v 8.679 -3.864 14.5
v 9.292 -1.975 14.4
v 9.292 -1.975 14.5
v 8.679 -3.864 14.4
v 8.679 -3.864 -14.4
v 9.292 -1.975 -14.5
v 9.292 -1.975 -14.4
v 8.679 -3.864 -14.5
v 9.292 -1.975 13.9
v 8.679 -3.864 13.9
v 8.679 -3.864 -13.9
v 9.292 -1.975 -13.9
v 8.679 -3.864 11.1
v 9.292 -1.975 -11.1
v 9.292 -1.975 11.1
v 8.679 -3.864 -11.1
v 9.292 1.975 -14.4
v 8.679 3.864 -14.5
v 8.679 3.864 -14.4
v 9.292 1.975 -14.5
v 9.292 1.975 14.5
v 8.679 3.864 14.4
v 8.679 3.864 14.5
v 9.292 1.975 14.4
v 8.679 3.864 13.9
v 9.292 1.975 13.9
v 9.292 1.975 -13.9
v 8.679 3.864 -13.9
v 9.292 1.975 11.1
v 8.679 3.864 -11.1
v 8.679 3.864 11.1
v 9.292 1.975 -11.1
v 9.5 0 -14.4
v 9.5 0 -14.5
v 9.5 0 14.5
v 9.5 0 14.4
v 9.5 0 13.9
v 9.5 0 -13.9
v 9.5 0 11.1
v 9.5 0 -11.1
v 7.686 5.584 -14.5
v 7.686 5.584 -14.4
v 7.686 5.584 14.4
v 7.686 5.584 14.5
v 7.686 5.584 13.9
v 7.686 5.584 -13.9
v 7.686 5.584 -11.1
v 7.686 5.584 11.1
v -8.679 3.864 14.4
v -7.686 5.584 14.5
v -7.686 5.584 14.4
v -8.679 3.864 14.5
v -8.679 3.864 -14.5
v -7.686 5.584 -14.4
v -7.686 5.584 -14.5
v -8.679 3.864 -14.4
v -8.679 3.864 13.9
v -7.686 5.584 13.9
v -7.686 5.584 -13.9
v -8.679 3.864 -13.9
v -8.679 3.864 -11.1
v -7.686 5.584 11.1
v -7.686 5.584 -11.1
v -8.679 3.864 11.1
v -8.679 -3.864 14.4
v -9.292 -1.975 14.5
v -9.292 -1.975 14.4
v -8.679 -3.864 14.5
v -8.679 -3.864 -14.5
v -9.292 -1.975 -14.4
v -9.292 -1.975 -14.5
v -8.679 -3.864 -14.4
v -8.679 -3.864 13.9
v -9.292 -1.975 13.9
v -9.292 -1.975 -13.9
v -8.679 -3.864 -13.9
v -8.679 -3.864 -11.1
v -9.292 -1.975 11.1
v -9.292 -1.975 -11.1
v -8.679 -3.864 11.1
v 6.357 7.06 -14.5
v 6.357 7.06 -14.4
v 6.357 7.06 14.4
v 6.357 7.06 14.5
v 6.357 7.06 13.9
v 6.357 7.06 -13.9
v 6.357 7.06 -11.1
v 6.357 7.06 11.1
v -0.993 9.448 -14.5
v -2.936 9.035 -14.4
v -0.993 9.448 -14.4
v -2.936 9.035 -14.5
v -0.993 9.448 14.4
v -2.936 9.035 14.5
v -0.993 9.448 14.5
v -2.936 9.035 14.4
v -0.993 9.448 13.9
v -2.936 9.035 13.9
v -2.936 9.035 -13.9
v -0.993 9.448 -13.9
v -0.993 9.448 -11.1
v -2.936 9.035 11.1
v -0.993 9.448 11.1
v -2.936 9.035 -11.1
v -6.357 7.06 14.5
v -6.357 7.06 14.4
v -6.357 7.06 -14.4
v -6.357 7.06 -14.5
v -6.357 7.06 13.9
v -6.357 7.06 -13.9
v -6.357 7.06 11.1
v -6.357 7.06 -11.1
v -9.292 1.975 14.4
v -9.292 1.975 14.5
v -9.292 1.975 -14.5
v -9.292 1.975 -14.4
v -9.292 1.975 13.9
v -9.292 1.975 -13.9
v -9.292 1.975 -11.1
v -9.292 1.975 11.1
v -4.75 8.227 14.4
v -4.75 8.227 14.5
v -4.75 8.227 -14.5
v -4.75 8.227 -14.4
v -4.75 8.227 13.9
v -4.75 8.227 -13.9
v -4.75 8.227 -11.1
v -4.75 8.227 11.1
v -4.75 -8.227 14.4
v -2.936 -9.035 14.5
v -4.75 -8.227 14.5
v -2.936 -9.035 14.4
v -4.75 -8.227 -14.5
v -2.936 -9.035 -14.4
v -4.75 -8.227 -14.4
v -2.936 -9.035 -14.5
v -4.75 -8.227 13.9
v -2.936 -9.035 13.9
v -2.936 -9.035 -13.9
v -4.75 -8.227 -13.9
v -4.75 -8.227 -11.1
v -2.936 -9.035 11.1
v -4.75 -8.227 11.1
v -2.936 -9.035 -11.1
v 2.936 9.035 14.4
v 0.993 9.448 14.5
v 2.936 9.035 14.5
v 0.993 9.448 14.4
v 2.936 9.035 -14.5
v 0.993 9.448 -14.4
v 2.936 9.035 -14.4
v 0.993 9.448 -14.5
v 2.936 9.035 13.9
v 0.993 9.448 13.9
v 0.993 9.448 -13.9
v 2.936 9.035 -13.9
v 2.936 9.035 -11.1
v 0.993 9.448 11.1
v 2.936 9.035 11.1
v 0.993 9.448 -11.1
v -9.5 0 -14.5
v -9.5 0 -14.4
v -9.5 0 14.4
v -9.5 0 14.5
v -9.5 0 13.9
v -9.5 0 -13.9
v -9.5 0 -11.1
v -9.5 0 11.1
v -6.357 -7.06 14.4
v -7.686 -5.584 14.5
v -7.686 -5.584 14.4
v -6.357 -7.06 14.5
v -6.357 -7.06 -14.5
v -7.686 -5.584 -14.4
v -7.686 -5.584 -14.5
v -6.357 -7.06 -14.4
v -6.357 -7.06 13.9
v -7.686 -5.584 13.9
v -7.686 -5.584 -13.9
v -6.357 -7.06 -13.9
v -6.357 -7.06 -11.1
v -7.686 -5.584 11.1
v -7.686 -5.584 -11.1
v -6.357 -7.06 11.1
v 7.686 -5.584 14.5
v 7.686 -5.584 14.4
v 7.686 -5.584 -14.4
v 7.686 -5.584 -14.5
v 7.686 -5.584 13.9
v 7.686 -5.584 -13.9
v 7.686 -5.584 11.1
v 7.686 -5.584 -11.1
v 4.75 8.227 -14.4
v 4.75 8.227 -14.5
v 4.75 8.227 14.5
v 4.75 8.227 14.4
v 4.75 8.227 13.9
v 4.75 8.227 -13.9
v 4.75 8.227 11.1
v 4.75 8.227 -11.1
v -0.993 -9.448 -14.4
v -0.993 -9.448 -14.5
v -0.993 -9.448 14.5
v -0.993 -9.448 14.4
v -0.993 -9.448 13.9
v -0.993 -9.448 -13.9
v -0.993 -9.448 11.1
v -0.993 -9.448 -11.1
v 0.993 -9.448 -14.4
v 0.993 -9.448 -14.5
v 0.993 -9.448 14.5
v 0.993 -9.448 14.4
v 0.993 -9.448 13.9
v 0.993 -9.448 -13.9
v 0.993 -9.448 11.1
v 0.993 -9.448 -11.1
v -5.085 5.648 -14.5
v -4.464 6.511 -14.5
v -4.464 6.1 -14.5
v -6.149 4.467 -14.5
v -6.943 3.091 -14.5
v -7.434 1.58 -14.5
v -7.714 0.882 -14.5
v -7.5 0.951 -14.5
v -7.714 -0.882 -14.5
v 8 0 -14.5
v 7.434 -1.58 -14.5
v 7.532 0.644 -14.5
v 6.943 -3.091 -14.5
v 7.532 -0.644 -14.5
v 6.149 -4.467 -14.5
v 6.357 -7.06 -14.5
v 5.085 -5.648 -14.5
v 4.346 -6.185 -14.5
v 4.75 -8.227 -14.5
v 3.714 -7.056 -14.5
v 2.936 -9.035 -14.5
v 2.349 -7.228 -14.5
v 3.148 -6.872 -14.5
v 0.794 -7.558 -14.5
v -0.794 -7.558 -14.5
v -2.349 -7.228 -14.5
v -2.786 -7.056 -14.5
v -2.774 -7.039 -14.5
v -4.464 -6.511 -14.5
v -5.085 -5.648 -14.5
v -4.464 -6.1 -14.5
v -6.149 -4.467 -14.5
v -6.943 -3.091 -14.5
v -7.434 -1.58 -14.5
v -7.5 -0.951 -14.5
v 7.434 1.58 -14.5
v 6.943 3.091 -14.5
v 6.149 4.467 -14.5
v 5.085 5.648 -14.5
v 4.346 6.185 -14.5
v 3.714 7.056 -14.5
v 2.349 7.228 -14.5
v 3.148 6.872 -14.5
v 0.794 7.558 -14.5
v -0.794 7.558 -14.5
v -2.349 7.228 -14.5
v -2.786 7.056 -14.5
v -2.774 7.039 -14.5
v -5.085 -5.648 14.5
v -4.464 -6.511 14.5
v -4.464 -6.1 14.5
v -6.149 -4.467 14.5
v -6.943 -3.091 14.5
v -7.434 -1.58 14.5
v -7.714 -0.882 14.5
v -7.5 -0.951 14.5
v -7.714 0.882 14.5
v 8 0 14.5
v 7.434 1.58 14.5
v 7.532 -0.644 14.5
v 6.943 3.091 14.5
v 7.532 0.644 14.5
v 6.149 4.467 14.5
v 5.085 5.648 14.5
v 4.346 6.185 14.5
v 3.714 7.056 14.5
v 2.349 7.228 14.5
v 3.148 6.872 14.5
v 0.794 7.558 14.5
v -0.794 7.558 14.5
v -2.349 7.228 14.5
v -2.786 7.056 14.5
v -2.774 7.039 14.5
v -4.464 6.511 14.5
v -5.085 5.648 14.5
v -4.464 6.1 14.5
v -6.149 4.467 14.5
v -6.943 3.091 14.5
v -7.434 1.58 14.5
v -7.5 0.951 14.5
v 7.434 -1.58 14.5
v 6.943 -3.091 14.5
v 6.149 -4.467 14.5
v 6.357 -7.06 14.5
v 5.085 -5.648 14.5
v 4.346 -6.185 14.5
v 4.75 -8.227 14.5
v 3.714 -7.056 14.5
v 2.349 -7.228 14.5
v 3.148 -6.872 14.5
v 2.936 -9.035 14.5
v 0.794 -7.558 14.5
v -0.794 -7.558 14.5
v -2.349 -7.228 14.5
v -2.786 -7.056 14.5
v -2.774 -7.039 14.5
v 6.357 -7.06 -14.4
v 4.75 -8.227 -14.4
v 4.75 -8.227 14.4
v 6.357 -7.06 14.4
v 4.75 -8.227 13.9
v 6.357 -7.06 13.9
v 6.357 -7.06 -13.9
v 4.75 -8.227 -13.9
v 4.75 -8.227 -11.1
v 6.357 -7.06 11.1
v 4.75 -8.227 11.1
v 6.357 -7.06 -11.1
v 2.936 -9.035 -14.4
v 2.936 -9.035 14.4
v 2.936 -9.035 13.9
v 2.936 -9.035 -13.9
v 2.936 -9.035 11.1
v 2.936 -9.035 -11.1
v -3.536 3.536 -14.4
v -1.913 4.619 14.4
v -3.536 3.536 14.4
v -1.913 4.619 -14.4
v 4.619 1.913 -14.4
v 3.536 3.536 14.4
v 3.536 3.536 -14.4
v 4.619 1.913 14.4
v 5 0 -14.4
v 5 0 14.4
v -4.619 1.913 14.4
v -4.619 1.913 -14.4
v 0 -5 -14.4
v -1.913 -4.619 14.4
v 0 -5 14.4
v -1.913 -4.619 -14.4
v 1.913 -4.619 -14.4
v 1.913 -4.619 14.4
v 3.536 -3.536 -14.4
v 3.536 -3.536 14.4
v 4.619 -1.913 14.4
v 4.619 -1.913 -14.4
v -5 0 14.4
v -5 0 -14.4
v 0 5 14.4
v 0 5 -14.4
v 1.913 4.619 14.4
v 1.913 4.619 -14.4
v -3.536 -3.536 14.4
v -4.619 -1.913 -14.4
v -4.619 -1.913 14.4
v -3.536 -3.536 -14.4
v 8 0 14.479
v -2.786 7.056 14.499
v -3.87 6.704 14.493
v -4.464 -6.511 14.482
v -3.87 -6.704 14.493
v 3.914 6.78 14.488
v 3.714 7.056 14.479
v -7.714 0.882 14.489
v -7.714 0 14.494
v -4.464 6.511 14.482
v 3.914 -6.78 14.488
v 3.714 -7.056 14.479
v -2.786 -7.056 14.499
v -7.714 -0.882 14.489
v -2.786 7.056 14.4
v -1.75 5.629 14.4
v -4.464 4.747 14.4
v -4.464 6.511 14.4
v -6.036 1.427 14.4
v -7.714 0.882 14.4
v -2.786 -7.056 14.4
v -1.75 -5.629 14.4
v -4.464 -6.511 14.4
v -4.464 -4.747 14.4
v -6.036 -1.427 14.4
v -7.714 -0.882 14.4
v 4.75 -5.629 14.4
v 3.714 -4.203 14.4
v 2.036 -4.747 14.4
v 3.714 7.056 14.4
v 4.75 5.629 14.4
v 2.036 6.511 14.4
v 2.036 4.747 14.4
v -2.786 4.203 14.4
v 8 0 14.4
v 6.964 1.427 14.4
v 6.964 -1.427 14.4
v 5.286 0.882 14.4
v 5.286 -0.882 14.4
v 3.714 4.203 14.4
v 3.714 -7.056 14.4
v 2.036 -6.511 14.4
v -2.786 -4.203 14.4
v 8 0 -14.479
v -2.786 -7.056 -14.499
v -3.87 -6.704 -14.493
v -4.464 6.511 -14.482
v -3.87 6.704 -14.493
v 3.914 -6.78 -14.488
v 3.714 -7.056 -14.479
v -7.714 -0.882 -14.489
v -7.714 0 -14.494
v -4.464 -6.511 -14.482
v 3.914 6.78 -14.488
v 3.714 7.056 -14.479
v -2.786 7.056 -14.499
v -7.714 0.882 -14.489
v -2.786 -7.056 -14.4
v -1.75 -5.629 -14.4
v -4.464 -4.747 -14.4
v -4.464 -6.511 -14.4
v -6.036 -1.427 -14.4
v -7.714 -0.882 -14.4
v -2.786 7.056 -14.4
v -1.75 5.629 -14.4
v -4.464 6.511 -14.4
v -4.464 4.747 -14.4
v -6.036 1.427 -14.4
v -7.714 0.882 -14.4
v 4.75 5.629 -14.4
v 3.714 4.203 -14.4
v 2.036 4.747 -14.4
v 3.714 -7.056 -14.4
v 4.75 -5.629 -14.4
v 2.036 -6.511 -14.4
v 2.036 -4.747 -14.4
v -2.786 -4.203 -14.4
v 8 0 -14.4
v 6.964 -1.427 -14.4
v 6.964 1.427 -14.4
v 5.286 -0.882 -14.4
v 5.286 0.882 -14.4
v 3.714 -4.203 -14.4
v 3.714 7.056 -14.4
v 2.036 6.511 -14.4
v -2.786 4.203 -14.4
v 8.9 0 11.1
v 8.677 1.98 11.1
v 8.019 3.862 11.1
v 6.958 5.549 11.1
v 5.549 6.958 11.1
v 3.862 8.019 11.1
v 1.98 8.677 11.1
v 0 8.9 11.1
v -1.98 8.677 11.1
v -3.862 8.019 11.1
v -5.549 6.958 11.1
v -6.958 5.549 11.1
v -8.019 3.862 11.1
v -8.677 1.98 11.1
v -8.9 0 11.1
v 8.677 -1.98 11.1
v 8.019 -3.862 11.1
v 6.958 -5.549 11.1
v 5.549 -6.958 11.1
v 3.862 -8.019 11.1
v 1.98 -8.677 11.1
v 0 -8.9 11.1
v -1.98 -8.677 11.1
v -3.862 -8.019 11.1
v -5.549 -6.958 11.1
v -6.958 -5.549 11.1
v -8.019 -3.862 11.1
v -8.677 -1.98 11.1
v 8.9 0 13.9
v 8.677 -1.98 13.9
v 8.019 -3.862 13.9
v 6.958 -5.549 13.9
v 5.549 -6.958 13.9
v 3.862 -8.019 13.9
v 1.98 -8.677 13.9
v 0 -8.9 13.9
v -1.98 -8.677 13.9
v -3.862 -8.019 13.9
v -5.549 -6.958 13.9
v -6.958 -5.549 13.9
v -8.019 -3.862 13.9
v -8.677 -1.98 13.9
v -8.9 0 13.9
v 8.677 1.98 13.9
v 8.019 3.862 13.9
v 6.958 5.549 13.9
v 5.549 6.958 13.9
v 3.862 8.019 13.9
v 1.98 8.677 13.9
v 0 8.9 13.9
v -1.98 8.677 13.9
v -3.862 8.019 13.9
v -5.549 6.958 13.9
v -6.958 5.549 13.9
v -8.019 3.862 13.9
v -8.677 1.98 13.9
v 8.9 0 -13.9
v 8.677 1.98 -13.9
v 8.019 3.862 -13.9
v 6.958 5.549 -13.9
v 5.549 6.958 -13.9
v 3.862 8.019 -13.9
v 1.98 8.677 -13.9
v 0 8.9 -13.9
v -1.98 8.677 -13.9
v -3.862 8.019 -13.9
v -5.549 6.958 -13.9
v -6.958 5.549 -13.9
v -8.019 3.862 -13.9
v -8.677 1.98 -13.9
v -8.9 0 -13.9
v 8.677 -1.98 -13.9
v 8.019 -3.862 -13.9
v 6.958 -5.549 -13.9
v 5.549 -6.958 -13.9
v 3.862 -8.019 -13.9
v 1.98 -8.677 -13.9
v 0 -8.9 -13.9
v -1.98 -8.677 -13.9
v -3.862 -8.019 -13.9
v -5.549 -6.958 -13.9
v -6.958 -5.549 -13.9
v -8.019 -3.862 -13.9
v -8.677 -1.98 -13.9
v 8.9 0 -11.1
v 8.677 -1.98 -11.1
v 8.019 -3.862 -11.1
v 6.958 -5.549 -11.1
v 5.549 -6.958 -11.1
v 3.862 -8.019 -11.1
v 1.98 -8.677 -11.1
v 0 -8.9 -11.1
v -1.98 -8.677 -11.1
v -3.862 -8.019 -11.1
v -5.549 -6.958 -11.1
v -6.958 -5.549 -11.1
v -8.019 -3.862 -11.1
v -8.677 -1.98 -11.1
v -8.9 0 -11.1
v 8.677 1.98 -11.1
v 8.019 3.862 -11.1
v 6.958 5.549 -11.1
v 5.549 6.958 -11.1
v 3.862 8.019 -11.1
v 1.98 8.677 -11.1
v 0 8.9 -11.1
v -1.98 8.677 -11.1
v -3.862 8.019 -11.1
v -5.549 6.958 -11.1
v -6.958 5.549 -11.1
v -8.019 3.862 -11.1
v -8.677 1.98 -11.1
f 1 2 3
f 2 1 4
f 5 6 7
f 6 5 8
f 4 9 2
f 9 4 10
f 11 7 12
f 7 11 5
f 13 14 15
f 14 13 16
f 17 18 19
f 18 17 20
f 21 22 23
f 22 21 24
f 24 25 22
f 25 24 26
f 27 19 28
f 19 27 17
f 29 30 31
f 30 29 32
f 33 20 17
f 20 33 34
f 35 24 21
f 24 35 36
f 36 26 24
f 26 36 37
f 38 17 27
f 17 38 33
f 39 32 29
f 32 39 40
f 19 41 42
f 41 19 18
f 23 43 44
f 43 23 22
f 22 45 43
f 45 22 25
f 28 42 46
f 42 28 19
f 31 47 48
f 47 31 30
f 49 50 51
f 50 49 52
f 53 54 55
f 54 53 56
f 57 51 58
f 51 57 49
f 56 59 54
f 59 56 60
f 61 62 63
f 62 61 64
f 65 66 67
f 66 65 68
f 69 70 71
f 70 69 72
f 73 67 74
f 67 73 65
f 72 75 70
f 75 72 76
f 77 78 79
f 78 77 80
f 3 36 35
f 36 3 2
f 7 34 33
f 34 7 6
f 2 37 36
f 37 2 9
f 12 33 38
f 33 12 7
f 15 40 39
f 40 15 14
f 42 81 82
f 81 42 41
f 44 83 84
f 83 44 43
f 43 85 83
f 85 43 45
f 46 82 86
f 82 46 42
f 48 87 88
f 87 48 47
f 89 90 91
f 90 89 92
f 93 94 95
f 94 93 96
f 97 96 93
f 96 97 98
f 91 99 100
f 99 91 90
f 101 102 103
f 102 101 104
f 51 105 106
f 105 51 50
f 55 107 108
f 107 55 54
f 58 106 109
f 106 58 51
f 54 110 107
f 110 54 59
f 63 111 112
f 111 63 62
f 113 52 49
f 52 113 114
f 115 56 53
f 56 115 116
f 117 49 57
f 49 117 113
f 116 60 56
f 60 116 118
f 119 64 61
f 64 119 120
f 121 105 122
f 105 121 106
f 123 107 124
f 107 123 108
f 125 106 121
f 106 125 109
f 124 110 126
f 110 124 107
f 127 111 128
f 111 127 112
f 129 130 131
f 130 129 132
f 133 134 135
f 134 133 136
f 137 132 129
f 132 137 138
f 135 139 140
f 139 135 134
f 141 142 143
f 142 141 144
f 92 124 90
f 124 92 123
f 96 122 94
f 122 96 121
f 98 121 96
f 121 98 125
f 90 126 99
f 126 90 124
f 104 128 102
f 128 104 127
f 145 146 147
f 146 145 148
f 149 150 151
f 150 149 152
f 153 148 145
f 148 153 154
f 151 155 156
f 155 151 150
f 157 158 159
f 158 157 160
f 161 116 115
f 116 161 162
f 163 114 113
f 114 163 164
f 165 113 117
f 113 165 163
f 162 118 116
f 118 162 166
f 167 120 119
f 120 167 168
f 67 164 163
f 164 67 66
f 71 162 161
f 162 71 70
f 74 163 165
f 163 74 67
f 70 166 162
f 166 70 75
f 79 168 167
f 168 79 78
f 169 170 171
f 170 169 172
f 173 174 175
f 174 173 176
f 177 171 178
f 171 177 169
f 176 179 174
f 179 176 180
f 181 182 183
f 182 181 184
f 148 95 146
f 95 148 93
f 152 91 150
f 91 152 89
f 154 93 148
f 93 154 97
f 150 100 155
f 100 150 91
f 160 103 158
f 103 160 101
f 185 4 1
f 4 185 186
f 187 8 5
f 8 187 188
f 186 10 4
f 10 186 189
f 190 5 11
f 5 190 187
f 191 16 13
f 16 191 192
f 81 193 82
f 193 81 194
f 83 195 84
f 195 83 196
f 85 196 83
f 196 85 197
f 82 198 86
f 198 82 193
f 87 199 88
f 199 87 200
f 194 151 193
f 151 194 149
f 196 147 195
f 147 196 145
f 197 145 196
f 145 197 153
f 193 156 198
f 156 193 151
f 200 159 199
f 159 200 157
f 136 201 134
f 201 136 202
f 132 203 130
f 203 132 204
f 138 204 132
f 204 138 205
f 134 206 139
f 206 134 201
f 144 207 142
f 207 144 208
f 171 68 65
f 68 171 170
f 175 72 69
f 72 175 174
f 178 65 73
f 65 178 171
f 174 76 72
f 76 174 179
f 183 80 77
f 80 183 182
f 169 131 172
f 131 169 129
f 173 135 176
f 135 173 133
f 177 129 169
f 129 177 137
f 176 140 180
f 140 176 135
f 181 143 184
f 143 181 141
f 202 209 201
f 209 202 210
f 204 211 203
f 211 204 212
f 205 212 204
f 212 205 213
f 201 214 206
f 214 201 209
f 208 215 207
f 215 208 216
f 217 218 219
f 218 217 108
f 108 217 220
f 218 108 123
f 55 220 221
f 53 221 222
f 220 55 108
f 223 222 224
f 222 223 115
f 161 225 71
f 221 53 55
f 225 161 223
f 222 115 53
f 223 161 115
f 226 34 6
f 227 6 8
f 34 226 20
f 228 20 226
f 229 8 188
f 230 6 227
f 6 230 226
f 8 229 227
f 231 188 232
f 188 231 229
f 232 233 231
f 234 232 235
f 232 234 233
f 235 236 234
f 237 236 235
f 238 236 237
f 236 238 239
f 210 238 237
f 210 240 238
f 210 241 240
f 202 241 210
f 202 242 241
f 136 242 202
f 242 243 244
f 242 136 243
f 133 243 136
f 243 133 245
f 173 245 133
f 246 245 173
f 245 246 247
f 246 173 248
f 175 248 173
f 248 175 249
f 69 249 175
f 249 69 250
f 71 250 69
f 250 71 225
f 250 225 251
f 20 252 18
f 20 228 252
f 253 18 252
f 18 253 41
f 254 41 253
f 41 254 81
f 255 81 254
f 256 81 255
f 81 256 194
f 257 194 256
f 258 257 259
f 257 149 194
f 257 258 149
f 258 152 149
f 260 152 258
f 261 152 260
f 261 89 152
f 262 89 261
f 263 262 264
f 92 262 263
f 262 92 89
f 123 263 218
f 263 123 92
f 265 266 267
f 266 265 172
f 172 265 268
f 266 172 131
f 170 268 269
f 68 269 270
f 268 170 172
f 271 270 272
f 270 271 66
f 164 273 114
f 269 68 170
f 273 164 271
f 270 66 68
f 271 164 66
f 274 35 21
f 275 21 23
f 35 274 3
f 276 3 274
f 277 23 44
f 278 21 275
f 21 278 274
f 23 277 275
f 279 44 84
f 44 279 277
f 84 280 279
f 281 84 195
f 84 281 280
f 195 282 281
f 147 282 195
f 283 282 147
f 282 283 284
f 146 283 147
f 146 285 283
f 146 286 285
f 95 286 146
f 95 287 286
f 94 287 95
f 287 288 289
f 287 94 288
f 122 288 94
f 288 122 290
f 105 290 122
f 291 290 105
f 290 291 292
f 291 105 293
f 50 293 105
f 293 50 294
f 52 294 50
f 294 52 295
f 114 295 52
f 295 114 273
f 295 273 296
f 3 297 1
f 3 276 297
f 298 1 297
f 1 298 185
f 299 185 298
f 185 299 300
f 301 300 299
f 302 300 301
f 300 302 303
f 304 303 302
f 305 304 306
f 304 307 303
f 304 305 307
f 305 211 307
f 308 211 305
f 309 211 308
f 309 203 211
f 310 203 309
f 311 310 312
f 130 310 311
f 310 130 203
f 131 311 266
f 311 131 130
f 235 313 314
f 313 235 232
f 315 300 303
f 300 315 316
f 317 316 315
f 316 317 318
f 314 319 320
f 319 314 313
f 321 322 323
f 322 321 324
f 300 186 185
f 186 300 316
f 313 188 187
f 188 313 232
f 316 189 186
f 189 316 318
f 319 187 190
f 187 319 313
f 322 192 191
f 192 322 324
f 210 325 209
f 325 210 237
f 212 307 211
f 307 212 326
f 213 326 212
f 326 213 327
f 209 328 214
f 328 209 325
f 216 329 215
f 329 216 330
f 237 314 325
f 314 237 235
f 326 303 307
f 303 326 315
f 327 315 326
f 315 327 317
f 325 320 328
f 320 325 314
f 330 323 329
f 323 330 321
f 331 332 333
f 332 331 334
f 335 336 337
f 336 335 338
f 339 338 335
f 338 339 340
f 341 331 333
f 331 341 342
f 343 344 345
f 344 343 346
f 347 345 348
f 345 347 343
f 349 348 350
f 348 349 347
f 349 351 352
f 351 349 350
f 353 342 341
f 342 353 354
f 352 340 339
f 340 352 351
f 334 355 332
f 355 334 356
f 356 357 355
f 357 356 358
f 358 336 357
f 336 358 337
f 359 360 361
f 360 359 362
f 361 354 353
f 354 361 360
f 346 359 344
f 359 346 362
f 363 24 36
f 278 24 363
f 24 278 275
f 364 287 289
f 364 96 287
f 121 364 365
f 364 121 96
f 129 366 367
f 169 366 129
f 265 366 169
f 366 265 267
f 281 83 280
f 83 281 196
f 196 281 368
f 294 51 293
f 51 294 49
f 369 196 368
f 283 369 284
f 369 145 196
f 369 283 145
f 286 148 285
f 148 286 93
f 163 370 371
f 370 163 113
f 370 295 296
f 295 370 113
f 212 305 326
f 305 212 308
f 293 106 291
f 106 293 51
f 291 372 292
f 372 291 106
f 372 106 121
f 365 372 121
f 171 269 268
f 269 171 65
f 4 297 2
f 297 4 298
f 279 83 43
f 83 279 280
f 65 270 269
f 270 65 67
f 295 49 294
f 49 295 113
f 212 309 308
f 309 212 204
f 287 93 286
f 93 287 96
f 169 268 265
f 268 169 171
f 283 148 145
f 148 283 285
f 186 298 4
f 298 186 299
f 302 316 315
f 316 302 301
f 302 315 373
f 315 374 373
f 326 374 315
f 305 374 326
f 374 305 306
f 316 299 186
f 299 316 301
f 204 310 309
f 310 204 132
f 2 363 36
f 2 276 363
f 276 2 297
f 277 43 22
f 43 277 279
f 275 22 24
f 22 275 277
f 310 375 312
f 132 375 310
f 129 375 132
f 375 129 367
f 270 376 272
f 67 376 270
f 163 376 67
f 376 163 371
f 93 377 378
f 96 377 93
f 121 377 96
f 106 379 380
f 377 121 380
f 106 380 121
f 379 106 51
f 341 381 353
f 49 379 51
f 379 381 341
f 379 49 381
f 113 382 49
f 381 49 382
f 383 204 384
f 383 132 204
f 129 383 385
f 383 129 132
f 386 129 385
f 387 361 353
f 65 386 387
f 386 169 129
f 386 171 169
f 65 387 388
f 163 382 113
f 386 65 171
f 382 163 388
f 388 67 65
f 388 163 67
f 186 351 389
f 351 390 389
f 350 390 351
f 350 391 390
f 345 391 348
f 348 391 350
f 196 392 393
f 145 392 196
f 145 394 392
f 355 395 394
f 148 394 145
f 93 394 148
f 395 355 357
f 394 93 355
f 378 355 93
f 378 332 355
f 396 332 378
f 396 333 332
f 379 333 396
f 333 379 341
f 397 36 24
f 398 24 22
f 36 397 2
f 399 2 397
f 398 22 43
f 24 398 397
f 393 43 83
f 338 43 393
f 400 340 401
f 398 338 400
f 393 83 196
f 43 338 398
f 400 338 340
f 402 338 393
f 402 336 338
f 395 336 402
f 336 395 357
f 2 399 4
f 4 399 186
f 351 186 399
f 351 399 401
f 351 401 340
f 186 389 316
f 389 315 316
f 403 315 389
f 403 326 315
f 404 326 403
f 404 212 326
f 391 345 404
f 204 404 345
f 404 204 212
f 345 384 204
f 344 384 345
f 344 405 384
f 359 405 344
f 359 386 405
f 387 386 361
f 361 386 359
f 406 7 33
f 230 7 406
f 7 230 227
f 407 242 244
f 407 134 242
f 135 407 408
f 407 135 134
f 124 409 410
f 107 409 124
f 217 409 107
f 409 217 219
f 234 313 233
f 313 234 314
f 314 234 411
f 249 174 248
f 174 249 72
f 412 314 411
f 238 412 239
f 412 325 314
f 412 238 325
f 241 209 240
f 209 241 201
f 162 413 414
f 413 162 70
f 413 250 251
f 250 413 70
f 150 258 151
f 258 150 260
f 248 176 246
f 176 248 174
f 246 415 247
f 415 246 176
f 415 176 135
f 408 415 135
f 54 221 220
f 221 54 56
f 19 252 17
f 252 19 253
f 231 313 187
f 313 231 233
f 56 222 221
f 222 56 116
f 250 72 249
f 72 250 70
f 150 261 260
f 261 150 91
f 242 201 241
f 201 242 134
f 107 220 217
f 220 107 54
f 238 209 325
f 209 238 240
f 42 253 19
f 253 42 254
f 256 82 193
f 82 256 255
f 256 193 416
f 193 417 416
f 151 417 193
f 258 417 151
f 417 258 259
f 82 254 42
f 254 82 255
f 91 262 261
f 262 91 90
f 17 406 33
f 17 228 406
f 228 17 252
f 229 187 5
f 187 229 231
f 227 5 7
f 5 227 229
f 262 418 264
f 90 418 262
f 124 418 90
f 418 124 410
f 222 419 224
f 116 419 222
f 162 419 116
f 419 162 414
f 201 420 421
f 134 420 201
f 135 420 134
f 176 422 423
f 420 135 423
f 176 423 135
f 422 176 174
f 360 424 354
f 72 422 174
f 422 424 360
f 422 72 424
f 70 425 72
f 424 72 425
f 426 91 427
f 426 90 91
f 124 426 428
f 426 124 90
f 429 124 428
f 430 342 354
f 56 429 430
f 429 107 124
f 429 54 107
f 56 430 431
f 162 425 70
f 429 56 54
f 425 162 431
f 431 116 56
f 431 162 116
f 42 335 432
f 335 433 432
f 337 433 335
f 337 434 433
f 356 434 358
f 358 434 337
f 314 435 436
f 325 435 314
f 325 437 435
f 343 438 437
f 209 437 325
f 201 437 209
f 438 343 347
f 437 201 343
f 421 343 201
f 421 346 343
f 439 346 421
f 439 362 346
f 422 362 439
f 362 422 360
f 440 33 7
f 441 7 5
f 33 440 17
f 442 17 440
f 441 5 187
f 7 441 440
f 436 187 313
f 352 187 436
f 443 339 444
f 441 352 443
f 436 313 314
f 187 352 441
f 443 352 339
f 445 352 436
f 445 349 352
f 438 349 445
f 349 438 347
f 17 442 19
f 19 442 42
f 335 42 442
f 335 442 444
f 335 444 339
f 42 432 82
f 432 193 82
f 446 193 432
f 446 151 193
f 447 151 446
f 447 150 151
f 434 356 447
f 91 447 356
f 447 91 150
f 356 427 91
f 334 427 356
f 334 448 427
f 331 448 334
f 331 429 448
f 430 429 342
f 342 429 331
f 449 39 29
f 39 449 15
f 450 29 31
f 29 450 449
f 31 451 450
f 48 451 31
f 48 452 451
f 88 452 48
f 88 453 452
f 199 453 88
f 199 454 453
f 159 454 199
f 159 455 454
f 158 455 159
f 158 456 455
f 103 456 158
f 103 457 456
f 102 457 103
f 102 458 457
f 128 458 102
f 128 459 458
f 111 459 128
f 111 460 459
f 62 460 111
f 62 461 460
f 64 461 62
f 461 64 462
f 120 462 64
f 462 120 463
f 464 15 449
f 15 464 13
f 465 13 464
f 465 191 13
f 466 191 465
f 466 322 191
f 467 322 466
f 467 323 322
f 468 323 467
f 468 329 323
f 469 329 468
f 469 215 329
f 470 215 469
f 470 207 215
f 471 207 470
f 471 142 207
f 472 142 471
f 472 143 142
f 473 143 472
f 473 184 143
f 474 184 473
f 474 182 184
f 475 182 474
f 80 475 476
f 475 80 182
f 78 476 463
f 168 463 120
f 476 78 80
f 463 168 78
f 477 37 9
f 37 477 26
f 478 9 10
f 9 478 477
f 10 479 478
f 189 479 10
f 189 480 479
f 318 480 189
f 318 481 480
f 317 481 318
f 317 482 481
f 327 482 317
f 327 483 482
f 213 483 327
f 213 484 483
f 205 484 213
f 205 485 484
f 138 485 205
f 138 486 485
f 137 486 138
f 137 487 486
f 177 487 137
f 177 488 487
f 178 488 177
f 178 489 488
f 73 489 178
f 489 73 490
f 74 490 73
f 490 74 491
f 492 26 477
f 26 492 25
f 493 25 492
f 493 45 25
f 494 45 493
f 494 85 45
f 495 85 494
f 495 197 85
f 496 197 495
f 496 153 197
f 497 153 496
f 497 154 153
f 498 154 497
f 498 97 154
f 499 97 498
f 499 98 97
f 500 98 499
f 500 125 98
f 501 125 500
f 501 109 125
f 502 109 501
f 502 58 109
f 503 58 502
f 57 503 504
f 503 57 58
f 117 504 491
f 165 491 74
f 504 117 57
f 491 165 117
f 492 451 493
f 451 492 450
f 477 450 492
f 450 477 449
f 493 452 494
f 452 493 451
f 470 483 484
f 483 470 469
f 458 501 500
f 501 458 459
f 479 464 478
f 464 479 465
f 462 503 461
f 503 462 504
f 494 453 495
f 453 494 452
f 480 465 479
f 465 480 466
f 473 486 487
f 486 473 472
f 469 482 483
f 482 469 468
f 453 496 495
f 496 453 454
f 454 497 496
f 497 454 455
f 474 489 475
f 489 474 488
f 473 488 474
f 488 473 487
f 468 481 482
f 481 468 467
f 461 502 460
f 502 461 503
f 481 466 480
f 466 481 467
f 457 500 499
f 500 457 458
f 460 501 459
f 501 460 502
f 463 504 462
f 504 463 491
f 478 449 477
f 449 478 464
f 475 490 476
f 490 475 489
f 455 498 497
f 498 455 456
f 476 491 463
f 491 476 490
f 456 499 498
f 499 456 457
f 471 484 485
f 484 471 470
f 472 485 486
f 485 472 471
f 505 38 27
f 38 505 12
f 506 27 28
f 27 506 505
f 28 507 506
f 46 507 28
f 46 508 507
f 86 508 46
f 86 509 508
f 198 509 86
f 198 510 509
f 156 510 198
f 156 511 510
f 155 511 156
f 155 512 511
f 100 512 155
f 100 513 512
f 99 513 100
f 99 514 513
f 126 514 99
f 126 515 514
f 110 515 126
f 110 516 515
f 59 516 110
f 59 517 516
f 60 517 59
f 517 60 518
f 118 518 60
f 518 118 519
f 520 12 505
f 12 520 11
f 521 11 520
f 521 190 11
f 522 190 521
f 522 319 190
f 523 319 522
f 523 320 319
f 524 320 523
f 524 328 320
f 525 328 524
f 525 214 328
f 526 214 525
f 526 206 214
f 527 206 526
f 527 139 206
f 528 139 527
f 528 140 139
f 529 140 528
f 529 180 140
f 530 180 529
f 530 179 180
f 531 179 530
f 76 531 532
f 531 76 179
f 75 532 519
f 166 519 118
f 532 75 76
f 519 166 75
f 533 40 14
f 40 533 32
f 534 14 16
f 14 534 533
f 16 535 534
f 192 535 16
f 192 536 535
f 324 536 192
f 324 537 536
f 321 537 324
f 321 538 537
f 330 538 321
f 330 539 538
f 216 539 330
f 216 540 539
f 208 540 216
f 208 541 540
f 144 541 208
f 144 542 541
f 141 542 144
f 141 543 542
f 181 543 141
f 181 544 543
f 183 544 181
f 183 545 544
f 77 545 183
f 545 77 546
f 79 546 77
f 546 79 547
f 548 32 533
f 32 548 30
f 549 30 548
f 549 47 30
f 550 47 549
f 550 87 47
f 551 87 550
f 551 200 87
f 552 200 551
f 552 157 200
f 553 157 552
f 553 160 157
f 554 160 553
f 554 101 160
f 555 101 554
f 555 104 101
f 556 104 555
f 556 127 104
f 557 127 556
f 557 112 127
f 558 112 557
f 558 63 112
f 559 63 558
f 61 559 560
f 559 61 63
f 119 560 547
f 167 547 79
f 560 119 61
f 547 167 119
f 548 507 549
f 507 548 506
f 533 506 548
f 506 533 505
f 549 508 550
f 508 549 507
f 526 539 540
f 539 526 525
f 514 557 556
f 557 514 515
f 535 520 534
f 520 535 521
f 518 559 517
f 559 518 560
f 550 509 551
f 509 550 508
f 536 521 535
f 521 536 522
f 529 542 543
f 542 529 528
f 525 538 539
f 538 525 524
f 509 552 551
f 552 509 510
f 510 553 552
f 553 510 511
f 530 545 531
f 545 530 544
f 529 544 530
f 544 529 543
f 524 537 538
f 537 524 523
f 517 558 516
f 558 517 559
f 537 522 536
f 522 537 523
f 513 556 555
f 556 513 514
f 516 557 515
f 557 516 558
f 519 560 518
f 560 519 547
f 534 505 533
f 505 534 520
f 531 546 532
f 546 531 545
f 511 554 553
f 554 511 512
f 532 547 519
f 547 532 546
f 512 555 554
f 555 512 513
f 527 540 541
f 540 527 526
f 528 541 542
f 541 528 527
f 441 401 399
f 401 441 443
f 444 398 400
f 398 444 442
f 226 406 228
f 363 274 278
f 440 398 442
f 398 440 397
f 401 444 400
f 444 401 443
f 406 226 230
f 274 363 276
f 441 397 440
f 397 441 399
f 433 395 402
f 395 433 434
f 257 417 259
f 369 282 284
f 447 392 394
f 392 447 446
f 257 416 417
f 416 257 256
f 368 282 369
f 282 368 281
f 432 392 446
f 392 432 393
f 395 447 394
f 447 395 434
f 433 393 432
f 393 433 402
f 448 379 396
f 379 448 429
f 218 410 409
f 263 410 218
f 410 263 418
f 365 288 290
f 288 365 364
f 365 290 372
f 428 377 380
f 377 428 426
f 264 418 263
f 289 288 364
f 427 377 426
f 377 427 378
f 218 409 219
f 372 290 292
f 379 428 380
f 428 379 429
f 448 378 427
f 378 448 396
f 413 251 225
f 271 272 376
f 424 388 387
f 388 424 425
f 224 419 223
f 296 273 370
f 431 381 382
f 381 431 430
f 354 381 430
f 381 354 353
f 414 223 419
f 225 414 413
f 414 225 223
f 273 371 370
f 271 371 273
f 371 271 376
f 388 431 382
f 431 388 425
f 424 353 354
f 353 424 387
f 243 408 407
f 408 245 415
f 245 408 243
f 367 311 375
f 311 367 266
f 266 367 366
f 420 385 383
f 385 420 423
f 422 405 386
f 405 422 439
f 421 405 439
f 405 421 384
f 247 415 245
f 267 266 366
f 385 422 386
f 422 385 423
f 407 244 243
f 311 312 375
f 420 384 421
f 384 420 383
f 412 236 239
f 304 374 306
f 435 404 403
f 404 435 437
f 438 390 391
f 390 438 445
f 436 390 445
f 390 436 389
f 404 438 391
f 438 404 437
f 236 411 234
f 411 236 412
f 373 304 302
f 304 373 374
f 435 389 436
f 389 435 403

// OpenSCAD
// Parameters
bore_d = 10; //[5:20:0.1]
outer_d = 19; //[10:38:0.1]
length = 29; //[15:58:0.1]
chamfer = 0.5; //[0.2:2:0.1]
eps = 0.8; //[0.5:2:0.1]
seal_groove_width = 1.2; //[0.6:2.4:0.1]
seal_groove_depth = 0.6; //[0.3:1.5:0.1]
seal_groove_offset = 2; //[1:5:0.1]
channel_count = 6; //[4:8:1]
channel_d = 3; //[2:5:0.1]
channel_radial_pos = 6.5; //[5.5:8:0.1]

// Base Shapes
module outer_cylindrical_body() {
  cylinder(h=length, r=outer_d/2, center=true);
}

module through_bore() {
  cylinder(h=length + 2*eps, r=bore_d/2, center=true);
}

module end_face_chamfer_cone_pos() {
  translate([0, 0, length/2 - chamfer/2 + eps/2])
    cylinder(h=chamfer, r1=outer_d/2, r2=0, center=true);
}

module end_face_chamfer_cone_neg() {
  translate([0, 0, -length/2 + chamfer/2 - eps/2])
    rotate([180, 0, 0])
    cylinder(h=chamfer, r1=outer_d/2, r2=0, center=true);
}

module seal_groove_cyl_pos() {
  translate([0, 0, length/2 - seal_groove_offset])
    cylinder(h=seal_groove_width + 2*eps, r=outer_d/2, center=true);
}

module seal_groove_cyl_neg() {
  translate([0, 0, -length/2 + seal_groove_offset])
    cylinder(h=seal_groove_width + 2*eps, r=outer_d/2, center=true);
}

module seal_groove_inner_cyl_pos() {
  translate([0, 0, length/2 - seal_groove_offset])
    cylinder(h=seal_groove_width + 2*eps, r=outer_d/2 - seal_groove_depth, center=true);
}

module seal_groove_inner_cyl_neg() {
  translate([0, 0, -length/2 + seal_groove_offset])
    cylinder(h=seal_groove_width + 2*eps, r=outer_d/2 - seal_groove_depth, center=true);
}

module channel_cyl(angle) {
  translate([channel_radial_pos*cos(angle), channel_radial_pos*sin(angle), 0])
    cylinder(h=length + 2*eps, r=channel_d/2, center=true);
}

// Operations
module ball_return_channels() {
  union() {
    for (i = [0:channel_count-1]) {
      channel_cyl(360/channel_count*i);
    }
  }
}

module end_face_chamfers() {
  union() {
    end_face_chamfer_cone_pos();
    end_face_chamfer_cone_neg();
  }
}

module seal_groove_ring_pos() {
  difference() {
    seal_groove_cyl_pos();
    seal_groove_inner_cyl_pos();
  }
}

module seal_groove_ring_neg() {
  difference() {
    seal_groove_cyl_neg();
    seal_groove_inner_cyl_neg();
  }
}

module seal_grooves() {
  union() {
    seal_groove_ring_pos();
    seal_groove_ring_neg();
  }
}

module bearing_sleeve_raw() {
  difference() {
    outer_cylindrical_body();
    through_bore();
  }
}

module bearing_with_chamfers() {
  difference() {
    bearing_sleeve_raw();
    end_face_chamfers();
  }
}

module bearing_with_seal_grooves() {
  difference() {
    bearing_with_chamfers();
    seal_grooves();
  }
}

module bearing_complete() {
  difference() {
    bearing_with_seal_grooves();
    ball_return_channels();
  }
}

// Final Output
bearing_complete();
